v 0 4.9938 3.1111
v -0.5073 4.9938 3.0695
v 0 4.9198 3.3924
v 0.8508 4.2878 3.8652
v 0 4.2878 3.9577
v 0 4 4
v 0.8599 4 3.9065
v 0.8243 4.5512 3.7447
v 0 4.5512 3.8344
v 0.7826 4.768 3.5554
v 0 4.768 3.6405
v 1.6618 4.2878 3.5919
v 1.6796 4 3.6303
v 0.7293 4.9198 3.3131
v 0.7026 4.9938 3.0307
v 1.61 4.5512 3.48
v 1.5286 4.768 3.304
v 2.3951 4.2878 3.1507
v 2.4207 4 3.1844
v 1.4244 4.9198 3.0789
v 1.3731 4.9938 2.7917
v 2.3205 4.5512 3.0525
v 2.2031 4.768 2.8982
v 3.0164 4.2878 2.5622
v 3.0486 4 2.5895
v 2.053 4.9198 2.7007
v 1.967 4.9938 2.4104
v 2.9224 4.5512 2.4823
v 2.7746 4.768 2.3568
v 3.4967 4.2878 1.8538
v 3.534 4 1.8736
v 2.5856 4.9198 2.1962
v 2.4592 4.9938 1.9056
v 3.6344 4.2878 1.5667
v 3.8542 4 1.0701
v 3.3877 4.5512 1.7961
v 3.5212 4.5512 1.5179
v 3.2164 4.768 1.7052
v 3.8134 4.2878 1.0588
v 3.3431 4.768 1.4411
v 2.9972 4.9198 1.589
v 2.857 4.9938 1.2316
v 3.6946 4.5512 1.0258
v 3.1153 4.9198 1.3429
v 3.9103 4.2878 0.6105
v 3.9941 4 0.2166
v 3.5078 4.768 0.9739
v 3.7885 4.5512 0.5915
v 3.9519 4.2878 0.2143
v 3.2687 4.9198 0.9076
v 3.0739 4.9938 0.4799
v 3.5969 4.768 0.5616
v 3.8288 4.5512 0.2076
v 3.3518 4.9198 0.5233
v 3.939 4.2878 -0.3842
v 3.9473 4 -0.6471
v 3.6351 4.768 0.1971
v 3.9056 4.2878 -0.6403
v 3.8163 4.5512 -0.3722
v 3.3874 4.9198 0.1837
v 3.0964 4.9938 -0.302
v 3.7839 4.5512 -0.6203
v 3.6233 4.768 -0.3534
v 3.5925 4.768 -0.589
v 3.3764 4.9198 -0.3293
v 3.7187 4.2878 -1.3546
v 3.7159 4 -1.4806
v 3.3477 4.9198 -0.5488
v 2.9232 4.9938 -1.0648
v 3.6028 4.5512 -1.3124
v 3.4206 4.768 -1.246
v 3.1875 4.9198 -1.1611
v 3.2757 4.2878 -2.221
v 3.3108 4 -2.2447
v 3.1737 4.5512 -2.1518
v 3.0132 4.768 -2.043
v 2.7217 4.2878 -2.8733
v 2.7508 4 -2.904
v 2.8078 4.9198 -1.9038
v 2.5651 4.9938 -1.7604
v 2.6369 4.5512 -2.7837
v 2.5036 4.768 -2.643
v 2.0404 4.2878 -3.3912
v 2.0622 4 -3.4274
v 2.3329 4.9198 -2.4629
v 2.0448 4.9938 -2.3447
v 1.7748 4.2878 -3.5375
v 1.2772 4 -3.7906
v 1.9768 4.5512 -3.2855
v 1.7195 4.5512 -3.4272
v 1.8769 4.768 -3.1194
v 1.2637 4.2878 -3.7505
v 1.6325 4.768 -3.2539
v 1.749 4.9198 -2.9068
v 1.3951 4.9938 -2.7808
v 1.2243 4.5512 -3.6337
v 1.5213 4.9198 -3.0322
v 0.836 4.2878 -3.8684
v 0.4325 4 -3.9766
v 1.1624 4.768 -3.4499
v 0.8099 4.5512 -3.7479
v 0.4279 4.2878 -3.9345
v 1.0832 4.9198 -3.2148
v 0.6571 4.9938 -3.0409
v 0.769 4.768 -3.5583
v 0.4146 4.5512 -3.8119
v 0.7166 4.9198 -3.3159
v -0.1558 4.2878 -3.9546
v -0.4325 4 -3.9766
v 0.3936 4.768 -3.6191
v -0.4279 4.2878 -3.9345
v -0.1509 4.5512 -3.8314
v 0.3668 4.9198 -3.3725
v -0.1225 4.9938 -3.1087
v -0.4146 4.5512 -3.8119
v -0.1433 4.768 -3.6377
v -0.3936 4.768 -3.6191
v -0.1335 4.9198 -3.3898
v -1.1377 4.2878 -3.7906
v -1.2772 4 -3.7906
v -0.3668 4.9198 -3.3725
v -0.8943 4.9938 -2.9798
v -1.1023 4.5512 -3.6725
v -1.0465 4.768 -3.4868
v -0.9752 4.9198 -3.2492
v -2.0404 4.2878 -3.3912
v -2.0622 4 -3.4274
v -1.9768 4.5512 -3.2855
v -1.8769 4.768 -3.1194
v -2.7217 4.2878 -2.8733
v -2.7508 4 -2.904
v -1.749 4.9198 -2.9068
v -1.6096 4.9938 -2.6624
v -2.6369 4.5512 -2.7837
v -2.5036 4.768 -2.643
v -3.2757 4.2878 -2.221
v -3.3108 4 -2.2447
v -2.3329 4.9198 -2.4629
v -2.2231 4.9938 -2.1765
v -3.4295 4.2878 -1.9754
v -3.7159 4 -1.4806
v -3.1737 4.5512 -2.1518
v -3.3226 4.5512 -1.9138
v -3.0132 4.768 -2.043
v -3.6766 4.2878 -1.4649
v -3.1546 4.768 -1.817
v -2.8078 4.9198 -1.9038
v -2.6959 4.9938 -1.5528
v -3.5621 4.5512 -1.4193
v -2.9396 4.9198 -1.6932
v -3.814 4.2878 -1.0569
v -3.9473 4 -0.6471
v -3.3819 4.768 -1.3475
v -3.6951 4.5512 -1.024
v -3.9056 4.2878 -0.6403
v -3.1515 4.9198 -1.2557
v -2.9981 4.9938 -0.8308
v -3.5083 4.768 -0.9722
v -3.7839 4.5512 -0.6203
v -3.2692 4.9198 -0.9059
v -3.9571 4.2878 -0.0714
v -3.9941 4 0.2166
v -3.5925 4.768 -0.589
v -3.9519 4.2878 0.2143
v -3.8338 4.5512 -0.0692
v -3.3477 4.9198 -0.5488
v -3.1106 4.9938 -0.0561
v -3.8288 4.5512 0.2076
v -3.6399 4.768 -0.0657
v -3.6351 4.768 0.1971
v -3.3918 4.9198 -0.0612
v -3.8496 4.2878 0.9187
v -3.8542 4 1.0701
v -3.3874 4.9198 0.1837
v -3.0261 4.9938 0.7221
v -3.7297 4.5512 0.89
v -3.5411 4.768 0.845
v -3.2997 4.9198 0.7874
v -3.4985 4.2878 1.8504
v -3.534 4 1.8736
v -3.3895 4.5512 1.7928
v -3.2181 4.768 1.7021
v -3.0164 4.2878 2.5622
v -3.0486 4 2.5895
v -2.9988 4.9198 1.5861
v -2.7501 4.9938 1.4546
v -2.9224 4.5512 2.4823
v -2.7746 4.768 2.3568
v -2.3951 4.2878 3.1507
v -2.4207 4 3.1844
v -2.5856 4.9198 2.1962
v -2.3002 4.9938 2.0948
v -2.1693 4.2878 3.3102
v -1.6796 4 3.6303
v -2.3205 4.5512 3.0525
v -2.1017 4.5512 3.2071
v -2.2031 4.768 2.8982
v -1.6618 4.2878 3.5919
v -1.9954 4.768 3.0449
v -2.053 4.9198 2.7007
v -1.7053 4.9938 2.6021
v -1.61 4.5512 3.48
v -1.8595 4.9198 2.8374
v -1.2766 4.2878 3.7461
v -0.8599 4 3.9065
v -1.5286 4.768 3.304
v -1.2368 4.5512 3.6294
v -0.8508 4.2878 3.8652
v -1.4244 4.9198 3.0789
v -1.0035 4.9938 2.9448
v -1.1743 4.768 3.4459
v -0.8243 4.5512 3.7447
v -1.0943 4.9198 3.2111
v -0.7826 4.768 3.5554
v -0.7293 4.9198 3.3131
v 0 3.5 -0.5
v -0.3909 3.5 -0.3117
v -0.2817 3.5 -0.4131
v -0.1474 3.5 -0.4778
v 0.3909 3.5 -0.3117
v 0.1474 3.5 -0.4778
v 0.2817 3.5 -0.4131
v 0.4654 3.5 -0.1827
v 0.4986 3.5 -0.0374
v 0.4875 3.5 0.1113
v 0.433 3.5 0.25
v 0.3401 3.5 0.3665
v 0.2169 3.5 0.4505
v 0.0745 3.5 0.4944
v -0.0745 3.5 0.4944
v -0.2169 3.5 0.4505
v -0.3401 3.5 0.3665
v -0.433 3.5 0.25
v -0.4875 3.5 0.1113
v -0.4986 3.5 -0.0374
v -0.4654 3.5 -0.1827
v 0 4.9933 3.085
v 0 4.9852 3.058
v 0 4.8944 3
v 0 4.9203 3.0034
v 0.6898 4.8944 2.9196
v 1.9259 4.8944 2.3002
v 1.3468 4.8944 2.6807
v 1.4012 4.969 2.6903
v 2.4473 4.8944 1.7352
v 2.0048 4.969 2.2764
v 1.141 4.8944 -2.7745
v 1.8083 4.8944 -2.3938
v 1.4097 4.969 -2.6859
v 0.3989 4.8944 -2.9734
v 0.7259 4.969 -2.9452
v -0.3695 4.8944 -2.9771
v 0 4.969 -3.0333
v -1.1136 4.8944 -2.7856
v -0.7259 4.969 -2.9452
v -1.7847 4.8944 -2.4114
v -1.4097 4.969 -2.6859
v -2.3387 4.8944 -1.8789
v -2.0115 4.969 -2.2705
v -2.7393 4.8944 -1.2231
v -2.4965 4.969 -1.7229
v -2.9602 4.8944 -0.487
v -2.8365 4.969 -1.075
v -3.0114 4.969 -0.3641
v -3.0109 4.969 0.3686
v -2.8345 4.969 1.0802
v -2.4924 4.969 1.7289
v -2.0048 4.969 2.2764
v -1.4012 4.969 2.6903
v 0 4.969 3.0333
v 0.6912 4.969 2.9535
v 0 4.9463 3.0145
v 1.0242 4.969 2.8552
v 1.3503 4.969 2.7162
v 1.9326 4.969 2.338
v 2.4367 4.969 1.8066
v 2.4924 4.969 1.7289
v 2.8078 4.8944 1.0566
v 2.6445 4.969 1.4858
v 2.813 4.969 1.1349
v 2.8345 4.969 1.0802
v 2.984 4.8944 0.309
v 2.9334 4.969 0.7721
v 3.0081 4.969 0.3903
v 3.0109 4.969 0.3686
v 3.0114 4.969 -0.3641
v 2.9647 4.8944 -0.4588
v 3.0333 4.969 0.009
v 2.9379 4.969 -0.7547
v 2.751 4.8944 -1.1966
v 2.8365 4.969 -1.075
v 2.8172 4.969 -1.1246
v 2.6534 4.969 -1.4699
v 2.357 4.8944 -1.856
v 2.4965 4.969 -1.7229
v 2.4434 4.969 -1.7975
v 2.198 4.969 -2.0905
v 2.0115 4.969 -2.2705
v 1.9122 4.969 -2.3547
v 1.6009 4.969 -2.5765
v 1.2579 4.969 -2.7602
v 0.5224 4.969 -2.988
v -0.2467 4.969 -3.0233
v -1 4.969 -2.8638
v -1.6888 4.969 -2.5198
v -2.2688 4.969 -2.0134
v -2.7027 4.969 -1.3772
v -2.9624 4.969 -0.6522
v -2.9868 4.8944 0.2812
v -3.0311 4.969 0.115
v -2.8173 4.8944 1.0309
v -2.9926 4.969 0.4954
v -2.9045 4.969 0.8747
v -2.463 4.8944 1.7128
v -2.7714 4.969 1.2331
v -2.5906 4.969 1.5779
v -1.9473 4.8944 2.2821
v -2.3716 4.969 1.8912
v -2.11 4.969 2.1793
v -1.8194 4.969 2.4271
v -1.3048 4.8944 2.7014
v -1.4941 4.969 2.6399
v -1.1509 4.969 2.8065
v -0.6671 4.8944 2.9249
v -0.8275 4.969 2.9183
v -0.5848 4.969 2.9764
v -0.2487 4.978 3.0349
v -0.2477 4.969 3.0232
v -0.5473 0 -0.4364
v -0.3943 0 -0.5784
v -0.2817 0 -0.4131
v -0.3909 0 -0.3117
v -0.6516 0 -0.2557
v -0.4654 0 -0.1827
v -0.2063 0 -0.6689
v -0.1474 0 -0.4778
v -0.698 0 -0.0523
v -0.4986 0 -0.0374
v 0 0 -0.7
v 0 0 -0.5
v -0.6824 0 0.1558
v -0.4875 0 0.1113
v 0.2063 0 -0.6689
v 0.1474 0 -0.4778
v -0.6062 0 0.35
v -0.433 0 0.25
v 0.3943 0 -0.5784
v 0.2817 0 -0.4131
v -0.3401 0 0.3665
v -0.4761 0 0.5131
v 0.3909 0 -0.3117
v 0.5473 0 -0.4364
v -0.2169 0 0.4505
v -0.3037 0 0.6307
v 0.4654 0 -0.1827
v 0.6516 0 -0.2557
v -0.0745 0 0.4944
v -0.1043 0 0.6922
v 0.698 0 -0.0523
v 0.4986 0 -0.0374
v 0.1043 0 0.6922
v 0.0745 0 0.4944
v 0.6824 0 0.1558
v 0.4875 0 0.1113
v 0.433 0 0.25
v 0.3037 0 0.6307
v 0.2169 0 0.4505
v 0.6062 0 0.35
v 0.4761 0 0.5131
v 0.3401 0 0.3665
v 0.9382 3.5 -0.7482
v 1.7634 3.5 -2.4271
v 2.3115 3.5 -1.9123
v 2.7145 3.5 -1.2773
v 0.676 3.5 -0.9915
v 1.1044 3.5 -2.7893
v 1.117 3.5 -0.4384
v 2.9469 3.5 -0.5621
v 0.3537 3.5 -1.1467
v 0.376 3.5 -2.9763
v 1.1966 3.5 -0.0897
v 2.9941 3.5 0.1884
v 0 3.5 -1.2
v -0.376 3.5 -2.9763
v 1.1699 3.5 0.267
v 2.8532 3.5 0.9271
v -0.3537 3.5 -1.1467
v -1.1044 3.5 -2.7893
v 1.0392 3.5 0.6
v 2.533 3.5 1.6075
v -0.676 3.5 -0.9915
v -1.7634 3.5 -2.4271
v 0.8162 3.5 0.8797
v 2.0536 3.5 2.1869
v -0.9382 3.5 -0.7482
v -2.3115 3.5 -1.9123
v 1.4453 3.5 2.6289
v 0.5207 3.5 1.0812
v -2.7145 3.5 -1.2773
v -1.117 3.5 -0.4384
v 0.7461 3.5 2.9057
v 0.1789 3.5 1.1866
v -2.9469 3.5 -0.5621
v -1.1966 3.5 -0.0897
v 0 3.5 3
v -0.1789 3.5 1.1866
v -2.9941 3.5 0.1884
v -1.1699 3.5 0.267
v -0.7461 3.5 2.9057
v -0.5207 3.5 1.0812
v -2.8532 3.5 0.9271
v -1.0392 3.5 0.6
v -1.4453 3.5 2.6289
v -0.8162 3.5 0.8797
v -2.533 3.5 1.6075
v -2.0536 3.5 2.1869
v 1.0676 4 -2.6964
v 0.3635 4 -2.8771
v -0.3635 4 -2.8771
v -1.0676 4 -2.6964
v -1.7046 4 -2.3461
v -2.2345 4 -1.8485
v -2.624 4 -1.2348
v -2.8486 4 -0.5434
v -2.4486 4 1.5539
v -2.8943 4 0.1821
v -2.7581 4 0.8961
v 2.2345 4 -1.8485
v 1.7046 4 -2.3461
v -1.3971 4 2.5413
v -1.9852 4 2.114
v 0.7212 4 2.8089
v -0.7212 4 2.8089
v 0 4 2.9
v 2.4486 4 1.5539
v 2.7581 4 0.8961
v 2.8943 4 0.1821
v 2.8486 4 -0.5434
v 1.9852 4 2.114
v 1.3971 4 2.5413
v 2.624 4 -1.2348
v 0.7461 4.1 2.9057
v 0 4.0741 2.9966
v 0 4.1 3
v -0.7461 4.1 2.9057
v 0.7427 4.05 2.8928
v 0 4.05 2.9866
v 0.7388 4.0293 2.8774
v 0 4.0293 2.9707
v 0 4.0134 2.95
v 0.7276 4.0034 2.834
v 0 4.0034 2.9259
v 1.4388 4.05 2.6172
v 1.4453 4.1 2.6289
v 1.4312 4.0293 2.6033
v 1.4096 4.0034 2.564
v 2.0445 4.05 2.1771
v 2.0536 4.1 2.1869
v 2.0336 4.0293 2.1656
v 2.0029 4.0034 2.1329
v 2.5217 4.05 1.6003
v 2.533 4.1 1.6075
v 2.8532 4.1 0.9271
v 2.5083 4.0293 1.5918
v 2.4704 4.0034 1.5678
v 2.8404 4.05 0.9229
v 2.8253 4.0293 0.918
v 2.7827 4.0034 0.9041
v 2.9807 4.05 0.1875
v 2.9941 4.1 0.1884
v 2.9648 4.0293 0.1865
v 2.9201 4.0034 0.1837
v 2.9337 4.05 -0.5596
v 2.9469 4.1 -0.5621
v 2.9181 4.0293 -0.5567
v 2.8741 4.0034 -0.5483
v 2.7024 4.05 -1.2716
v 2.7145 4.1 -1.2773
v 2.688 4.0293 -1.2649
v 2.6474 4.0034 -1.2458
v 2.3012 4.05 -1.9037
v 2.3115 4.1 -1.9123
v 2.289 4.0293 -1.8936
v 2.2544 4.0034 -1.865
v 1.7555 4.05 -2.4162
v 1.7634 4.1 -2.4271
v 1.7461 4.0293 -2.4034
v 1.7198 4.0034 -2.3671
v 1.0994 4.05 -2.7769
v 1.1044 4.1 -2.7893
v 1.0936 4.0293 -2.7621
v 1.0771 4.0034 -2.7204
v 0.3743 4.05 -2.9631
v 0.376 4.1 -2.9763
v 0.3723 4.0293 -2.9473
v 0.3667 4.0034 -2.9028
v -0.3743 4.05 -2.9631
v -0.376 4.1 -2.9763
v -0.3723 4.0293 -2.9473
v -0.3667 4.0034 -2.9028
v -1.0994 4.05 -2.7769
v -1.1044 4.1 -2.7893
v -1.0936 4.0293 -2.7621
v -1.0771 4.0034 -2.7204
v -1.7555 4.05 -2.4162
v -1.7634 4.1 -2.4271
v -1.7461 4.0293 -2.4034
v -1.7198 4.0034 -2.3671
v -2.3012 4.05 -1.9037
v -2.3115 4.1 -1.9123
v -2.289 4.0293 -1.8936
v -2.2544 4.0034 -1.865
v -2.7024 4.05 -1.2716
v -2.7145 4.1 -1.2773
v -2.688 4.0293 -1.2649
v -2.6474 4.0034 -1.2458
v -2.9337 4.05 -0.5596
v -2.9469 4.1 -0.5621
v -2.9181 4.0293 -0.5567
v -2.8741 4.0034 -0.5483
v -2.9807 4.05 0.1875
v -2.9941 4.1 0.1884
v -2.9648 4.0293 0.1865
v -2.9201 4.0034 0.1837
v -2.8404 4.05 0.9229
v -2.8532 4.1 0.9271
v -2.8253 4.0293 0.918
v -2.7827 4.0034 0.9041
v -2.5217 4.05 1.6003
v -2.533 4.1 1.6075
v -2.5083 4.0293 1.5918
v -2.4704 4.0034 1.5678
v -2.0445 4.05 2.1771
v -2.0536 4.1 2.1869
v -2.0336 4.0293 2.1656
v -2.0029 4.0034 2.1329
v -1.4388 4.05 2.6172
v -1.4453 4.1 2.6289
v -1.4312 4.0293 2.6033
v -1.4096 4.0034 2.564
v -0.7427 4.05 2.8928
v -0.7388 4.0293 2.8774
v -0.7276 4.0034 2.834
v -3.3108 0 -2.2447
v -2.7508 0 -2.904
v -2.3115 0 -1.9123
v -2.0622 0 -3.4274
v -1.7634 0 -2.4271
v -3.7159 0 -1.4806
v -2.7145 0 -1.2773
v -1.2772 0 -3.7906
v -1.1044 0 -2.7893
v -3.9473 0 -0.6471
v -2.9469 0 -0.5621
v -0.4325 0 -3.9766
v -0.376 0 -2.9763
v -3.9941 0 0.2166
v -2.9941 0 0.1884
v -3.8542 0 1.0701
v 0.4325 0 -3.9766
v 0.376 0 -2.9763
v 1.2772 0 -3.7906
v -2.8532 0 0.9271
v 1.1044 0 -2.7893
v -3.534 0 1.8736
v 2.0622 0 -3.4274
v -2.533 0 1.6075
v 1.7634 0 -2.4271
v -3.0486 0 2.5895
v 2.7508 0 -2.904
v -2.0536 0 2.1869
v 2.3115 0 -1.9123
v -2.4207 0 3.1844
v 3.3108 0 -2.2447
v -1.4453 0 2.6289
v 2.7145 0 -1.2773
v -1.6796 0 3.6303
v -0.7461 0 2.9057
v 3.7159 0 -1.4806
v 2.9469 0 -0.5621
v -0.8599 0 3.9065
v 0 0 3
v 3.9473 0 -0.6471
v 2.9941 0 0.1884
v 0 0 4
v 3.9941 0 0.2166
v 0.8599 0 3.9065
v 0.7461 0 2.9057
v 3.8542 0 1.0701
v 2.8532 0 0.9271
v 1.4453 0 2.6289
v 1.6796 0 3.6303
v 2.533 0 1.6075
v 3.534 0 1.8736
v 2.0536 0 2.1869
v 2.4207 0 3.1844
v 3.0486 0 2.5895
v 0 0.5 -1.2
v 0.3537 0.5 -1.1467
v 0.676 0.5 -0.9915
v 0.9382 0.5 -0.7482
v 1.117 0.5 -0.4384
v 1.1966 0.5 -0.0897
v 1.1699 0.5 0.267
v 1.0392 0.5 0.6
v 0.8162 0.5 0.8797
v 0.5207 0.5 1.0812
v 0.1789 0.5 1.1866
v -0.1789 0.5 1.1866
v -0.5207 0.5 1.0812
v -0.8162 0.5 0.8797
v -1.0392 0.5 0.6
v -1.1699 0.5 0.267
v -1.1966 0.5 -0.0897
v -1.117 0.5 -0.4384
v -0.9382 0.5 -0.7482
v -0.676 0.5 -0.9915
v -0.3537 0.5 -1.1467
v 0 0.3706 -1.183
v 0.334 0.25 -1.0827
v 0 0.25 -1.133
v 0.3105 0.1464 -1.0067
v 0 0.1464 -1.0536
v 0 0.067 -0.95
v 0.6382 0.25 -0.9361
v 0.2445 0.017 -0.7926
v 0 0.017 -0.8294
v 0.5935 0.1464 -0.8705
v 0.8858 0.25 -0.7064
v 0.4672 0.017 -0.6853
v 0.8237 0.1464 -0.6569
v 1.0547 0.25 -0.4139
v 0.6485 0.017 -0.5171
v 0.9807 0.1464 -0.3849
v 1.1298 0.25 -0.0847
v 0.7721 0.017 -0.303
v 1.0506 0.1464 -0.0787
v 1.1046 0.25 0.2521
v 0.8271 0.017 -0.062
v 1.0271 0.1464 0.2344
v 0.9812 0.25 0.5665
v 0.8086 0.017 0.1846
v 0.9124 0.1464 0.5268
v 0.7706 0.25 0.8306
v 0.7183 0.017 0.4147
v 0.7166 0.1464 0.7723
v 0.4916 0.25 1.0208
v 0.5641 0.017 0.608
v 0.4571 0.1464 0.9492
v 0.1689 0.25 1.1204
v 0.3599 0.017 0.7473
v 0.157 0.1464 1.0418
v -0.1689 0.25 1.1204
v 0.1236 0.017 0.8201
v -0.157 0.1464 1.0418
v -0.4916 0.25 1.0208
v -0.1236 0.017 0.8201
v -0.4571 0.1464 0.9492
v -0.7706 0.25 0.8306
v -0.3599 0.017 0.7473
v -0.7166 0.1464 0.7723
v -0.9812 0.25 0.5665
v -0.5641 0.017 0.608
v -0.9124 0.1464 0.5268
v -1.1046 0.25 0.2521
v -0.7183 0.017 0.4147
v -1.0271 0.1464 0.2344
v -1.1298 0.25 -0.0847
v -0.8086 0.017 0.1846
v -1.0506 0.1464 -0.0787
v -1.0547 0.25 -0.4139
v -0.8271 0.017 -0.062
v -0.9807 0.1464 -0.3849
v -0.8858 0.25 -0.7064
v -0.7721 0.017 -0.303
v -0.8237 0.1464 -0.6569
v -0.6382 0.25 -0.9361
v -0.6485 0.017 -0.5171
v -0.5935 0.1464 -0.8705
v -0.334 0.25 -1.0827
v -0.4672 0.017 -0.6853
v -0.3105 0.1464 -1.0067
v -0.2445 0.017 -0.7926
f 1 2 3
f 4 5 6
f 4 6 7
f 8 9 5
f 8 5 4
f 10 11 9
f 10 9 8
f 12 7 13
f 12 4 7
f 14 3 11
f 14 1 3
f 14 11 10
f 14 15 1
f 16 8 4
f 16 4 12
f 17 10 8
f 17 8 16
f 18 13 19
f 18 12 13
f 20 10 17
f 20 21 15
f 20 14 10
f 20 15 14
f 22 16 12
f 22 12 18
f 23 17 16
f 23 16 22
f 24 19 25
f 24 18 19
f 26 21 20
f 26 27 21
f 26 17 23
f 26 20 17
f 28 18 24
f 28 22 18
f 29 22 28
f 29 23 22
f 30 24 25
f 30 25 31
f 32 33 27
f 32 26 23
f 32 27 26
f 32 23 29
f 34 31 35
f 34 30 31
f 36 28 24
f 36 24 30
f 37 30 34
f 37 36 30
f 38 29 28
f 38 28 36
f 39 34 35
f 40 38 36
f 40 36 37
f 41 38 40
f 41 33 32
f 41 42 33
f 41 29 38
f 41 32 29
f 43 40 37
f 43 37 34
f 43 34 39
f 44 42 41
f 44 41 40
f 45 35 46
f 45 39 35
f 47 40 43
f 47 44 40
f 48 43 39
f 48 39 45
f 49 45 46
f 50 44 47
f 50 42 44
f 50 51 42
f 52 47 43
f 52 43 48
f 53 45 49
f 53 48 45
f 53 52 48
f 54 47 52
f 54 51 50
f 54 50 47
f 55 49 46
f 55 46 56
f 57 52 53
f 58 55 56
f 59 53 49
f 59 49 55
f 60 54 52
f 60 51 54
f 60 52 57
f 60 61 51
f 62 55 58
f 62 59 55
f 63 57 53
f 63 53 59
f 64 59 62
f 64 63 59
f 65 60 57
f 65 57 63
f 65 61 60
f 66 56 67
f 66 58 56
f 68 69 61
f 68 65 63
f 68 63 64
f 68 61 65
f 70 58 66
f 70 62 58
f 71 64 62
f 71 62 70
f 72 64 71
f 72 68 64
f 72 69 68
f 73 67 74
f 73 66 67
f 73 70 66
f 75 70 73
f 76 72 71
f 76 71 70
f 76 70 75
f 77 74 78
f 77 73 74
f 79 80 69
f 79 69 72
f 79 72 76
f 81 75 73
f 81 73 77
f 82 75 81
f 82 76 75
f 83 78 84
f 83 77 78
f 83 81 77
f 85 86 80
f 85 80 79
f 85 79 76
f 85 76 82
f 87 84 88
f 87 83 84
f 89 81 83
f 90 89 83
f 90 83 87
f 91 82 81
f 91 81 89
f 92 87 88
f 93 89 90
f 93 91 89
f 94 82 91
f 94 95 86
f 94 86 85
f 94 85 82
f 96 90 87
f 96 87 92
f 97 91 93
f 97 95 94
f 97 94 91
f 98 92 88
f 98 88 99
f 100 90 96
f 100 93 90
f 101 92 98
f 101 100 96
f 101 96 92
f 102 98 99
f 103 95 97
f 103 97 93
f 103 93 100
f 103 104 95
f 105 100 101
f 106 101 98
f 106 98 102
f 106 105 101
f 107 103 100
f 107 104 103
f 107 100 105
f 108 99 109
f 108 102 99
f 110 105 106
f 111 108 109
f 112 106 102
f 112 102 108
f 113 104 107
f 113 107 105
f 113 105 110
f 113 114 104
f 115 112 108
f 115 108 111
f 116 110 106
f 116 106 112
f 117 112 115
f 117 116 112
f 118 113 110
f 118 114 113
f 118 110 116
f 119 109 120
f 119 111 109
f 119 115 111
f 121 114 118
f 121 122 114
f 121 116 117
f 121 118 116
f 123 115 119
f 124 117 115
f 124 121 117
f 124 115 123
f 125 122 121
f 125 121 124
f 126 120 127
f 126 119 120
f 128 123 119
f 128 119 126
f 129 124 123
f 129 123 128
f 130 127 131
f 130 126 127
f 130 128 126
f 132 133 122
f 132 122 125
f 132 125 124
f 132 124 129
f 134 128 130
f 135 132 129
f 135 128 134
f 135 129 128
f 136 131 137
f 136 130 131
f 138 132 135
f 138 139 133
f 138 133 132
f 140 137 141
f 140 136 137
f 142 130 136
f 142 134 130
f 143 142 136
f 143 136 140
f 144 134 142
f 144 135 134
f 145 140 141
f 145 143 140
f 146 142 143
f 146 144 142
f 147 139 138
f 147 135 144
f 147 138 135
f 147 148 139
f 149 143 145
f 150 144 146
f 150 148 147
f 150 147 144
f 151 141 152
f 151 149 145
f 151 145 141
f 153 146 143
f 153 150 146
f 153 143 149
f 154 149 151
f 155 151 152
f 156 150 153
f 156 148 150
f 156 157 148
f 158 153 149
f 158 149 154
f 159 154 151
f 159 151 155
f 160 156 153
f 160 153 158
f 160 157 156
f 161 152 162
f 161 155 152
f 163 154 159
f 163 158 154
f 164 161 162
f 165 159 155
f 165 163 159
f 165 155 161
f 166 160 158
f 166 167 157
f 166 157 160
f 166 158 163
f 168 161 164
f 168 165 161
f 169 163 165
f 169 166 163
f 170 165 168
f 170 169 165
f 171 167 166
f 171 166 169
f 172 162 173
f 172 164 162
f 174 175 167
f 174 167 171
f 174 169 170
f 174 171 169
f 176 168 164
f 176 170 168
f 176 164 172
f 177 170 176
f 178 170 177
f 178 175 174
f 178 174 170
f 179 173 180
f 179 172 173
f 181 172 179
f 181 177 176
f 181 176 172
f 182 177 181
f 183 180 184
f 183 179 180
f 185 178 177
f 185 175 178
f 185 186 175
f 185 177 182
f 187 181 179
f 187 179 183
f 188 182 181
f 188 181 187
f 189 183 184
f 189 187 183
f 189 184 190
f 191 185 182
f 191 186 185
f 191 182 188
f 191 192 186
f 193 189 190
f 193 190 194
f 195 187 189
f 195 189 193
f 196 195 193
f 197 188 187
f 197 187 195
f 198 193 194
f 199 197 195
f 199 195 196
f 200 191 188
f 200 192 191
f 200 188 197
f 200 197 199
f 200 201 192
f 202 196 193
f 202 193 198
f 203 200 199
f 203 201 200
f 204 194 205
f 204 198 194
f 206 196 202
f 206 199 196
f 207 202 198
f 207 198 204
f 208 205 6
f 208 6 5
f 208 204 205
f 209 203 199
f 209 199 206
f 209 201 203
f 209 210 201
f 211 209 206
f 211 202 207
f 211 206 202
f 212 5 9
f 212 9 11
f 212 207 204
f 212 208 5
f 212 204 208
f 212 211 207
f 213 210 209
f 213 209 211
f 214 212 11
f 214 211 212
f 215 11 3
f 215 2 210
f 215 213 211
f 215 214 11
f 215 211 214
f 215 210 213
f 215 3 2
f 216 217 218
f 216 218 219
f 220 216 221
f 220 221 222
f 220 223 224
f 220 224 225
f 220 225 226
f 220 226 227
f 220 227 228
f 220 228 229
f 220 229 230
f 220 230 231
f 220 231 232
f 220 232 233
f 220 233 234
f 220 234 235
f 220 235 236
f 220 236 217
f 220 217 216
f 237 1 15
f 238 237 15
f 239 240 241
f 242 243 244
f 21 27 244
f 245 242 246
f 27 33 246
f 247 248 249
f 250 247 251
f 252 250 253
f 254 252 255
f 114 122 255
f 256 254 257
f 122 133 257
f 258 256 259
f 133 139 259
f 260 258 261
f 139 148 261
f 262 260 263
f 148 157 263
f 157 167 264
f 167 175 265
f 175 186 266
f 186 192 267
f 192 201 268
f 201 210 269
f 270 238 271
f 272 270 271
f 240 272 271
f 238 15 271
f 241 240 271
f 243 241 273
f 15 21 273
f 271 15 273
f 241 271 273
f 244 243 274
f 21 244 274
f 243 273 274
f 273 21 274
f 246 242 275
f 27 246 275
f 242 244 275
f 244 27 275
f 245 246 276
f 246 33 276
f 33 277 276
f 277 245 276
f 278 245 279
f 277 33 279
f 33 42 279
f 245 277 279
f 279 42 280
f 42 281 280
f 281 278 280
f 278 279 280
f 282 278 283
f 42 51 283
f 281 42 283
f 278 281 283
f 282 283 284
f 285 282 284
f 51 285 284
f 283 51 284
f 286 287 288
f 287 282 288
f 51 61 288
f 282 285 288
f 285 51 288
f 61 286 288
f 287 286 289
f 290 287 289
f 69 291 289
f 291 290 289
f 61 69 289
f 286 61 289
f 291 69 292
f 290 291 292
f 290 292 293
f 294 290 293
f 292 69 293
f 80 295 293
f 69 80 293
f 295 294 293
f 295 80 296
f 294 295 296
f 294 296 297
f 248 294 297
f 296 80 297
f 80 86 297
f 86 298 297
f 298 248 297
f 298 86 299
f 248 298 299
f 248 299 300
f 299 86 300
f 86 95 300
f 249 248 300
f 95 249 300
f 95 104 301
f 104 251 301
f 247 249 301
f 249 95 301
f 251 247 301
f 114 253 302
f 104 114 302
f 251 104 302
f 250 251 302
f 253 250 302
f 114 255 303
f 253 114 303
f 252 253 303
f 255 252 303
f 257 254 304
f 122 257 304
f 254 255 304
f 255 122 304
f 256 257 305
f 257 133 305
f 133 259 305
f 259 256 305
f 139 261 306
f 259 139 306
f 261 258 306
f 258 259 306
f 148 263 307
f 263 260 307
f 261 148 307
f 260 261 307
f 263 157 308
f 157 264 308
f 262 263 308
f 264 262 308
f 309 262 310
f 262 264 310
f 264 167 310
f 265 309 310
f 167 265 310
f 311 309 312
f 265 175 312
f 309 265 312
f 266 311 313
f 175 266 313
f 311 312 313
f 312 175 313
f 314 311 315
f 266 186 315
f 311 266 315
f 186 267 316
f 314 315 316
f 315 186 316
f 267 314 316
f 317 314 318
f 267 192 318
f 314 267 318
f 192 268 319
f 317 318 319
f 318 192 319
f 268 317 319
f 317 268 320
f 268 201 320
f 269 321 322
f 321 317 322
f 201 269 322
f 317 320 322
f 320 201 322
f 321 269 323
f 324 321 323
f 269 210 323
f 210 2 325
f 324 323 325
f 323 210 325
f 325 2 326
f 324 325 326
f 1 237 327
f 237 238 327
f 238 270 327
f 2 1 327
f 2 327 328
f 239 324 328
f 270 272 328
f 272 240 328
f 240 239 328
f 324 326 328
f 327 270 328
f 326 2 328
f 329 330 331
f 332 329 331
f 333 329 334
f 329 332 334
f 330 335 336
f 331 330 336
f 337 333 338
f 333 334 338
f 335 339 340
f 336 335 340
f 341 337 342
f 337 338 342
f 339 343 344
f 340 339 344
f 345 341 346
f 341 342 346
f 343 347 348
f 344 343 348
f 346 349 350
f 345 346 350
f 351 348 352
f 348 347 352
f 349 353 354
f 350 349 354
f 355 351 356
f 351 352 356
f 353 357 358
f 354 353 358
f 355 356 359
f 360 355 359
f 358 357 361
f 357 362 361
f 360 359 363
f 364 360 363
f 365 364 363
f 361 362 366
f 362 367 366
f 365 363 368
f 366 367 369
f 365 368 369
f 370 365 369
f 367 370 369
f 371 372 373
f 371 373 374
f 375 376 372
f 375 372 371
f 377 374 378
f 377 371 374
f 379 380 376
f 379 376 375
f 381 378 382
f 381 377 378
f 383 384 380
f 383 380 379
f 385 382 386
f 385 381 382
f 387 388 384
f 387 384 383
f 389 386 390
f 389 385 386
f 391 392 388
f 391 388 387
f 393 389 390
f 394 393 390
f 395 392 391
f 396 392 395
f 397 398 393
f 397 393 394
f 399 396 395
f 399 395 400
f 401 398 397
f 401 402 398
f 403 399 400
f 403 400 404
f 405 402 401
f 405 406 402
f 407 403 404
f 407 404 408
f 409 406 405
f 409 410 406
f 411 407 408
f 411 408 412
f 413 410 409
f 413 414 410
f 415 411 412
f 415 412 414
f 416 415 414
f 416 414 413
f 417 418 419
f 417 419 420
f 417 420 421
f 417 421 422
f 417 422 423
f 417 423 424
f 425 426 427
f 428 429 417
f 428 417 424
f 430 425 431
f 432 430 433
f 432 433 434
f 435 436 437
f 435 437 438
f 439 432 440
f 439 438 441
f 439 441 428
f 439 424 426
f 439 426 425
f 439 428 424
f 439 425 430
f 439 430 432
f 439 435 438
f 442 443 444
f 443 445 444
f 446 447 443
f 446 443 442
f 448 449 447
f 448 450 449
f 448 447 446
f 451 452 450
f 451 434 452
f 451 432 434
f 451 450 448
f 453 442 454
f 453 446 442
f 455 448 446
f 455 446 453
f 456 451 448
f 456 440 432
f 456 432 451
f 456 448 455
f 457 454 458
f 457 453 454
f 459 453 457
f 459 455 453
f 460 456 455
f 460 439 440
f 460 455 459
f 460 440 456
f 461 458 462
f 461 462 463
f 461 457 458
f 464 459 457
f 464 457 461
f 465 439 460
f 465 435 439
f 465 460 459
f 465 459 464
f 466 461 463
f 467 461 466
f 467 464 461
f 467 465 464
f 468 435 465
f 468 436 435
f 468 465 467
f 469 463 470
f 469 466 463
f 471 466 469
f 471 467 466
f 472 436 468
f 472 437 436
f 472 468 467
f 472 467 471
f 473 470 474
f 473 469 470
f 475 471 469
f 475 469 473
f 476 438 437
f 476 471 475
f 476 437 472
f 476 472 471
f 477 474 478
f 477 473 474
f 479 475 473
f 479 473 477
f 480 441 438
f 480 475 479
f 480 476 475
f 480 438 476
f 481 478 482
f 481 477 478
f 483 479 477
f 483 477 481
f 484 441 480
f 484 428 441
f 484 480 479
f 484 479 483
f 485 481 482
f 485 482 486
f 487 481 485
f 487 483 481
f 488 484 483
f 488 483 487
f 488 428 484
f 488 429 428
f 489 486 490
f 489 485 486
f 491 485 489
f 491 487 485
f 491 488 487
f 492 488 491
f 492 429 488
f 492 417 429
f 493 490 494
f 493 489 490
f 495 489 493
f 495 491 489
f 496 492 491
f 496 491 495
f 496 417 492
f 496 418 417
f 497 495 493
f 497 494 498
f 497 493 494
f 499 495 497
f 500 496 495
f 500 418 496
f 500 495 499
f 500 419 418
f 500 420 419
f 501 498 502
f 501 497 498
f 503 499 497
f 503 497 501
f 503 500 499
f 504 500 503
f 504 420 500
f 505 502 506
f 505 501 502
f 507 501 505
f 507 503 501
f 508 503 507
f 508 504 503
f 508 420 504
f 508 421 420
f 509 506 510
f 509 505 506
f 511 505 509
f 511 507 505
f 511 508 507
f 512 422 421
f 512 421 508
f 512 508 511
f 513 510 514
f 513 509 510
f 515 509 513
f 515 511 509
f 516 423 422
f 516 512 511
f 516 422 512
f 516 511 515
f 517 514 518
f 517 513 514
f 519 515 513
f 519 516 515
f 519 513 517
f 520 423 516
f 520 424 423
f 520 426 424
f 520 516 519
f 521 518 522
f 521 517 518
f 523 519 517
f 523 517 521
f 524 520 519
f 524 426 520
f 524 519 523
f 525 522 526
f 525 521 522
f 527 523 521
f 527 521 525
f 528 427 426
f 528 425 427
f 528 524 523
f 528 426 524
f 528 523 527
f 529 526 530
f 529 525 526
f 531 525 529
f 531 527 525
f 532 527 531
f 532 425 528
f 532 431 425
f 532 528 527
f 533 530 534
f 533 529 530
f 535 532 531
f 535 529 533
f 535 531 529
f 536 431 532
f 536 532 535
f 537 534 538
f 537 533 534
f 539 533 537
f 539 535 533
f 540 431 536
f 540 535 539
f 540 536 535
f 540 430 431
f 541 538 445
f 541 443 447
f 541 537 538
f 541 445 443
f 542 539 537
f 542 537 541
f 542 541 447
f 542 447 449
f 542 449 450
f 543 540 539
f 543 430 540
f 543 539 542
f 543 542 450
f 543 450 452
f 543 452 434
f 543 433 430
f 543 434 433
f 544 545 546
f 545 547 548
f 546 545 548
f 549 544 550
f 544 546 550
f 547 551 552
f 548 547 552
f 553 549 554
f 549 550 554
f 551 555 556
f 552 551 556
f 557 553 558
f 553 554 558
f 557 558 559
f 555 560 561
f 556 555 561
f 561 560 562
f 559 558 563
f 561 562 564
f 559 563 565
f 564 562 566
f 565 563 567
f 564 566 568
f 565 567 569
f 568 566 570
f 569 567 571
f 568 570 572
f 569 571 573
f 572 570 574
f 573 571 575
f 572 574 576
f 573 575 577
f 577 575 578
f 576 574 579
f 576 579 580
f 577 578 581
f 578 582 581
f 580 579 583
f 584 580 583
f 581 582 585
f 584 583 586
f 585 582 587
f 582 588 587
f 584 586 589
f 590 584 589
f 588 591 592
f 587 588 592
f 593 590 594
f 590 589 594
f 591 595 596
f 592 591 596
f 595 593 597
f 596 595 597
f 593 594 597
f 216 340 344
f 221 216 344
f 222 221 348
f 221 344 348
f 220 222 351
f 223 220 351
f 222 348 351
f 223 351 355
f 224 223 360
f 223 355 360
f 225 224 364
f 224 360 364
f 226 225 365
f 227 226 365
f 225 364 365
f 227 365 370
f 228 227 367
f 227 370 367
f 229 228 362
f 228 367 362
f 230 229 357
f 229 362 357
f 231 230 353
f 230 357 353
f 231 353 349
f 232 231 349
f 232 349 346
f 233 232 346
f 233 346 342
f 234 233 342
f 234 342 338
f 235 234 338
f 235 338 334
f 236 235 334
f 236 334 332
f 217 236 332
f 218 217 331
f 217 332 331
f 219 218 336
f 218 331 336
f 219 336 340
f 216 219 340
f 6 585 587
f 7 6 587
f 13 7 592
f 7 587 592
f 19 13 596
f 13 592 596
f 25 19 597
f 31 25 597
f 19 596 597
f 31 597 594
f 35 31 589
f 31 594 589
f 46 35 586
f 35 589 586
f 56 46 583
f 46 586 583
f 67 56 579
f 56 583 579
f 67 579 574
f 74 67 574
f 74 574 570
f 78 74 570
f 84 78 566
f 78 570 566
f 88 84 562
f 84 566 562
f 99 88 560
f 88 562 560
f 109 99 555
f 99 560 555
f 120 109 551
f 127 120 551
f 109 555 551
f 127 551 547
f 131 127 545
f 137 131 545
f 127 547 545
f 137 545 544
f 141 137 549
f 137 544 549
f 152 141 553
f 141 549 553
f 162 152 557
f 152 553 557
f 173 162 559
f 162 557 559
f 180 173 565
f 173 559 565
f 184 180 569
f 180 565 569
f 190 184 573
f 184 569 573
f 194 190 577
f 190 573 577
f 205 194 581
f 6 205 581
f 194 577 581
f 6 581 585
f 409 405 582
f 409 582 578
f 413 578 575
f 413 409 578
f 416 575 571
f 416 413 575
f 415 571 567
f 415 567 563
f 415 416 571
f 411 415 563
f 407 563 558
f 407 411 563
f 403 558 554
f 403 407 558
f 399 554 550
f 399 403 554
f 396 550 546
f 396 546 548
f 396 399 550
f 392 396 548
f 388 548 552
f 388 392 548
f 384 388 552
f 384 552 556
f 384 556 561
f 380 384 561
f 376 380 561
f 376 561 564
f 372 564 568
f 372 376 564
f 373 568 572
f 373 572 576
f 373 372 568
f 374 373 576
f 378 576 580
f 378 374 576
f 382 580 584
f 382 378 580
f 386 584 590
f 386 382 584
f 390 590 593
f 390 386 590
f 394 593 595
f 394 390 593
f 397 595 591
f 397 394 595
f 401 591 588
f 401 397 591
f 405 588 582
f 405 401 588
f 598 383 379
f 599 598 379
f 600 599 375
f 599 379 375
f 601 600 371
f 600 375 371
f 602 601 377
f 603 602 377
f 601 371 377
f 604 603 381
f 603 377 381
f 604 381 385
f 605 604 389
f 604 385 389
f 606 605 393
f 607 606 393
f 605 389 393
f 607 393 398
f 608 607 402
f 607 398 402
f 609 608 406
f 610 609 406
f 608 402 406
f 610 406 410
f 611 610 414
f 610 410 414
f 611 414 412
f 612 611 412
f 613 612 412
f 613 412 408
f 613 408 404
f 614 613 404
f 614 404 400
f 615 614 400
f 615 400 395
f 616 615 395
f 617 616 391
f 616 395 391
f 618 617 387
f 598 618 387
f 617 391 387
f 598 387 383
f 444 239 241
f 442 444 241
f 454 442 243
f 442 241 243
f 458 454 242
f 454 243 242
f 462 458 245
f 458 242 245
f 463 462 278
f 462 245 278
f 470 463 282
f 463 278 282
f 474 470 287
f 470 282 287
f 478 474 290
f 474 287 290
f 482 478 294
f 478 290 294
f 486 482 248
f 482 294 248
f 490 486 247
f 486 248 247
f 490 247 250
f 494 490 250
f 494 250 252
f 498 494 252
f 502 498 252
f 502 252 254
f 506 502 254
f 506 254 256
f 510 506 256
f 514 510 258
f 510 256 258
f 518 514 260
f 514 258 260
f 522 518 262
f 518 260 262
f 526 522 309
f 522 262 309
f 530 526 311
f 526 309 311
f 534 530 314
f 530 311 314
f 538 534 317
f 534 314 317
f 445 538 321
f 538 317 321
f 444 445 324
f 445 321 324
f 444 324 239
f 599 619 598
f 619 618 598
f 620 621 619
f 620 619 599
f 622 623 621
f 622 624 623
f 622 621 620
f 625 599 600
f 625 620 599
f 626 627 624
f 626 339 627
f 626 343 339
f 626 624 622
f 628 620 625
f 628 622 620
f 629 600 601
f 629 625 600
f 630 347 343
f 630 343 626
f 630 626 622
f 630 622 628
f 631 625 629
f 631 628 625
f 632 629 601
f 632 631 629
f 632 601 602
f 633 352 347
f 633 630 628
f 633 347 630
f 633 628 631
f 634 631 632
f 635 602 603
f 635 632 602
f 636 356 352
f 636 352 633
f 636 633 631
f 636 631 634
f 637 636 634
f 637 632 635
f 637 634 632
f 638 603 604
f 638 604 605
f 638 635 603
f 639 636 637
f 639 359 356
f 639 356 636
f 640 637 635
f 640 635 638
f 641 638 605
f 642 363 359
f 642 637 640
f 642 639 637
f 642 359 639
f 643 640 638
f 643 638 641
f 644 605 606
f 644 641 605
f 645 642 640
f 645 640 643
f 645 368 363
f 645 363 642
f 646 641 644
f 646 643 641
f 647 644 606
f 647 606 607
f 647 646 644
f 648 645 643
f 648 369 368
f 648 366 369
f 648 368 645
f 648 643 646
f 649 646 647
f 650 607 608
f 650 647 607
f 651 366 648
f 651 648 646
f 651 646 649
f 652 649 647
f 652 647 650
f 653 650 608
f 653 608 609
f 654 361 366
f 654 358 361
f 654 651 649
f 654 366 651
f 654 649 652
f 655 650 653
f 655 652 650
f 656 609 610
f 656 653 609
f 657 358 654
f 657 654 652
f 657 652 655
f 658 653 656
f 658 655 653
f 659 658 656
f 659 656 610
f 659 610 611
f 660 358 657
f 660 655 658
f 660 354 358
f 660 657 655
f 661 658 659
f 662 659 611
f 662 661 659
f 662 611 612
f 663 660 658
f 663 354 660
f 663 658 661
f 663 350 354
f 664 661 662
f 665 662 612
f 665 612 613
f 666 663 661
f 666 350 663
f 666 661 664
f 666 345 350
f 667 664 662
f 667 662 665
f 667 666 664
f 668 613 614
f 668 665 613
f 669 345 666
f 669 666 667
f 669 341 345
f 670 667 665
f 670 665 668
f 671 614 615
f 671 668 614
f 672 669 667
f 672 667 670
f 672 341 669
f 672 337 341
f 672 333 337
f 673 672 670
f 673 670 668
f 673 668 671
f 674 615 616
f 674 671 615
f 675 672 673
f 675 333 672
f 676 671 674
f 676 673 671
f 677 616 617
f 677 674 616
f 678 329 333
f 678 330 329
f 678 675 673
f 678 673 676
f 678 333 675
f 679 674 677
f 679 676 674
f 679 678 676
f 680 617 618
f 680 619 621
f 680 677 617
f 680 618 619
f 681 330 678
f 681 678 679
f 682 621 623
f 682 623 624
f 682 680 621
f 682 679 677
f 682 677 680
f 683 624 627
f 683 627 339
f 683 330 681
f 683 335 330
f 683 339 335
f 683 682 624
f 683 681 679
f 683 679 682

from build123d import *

# Parameters (mm, degrees)
SKETCH1_R           = 4
BOSS_EXTRUDE1_DEPTH = 5
FILLET1_R           = 1
SKETCH2_R           = 3
CUT_EXTRUDE1_DEPTH  = 1
FILLET2_R           = 0.1
CUT_EXTRUDE3_START  = -3.5
SKETCH3_R           = 3
SKETCH3_R_2         = 1.2
CUT_EXTRUDE3_DEPTH  = 3.5
SKETCH4_R           = 0.5
CUT_EXTRUDE4_DEPTH  = 3.5
FILLET3_R           = 0.5


with BuildPart() as part:
    # Sketch1 → Boss-Extrude1 (new body)
    with BuildSketch(Plane(origin=(0, 0, 0), x_dir=(1, 0, 0), z_dir=(0, 1, 0))):
        with Locations(Location((0, 0, 0), (0, 0, 270))):
            Circle(SKETCH1_R)
    extrude(amount=BOSS_EXTRUDE1_DEPTH)

    # Fillet1
    fillet1_edges = [part.edges().sort_by_distance(p)[0] for p in [
        (0, 5, -4),
    ]]
    fillet(fillet1_edges, radius=FILLET1_R)

    # Sketch2 → Cut-Extrude1 (cut)
    with BuildSketch(Plane(origin=(0, 5, 0), x_dir=(1, 0, 0), z_dir=(0, 1, 0))):
        with Locations(Location((0, 0, 0), (0, 0, 270))):
            Circle(SKETCH2_R)
    extrude(amount=-CUT_EXTRUDE1_DEPTH, mode=Mode.SUBTRACT)

    # Fillet2
    fillet2_edges = [part.edges().sort_by_distance(p)[0] for p in [
        (0, 5, -3),
        (0, 4, -3),
    ]]
    fillet(fillet2_edges, radius=FILLET2_R)

    # Sketch3 → Cut-Extrude3 (cut)
    with BuildSketch(Plane.XZ.offset(CUT_EXTRUDE3_START)):
        with Locations(Location((0, 0, 0), (0, 0, 90))):
            Circle(SKETCH3_R)
        with Locations(Location((0, 0, 0), (0, 0, 270))):
            Circle(SKETCH3_R_2, mode=Mode.SUBTRACT)
    extrude(amount=CUT_EXTRUDE3_DEPTH, mode=Mode.SUBTRACT)

    # Sketch4 → Cut-Extrude4 (cut)
    with BuildSketch(Plane.XZ):
        with Locations(Location((0, 0, 0), (0, 0, 270))):
            Circle(SKETCH4_R)
    extrude(amount=-CUT_EXTRUDE4_DEPTH, mode=Mode.SUBTRACT)

    # Fillet3
    fillet3_edges = [part.edges().sort_by_distance(p)[0] for p in [
        (0, 0, 1.2),
    ]]
    fillet(fillet3_edges, radius=FILLET3_R)


solid = part.part
